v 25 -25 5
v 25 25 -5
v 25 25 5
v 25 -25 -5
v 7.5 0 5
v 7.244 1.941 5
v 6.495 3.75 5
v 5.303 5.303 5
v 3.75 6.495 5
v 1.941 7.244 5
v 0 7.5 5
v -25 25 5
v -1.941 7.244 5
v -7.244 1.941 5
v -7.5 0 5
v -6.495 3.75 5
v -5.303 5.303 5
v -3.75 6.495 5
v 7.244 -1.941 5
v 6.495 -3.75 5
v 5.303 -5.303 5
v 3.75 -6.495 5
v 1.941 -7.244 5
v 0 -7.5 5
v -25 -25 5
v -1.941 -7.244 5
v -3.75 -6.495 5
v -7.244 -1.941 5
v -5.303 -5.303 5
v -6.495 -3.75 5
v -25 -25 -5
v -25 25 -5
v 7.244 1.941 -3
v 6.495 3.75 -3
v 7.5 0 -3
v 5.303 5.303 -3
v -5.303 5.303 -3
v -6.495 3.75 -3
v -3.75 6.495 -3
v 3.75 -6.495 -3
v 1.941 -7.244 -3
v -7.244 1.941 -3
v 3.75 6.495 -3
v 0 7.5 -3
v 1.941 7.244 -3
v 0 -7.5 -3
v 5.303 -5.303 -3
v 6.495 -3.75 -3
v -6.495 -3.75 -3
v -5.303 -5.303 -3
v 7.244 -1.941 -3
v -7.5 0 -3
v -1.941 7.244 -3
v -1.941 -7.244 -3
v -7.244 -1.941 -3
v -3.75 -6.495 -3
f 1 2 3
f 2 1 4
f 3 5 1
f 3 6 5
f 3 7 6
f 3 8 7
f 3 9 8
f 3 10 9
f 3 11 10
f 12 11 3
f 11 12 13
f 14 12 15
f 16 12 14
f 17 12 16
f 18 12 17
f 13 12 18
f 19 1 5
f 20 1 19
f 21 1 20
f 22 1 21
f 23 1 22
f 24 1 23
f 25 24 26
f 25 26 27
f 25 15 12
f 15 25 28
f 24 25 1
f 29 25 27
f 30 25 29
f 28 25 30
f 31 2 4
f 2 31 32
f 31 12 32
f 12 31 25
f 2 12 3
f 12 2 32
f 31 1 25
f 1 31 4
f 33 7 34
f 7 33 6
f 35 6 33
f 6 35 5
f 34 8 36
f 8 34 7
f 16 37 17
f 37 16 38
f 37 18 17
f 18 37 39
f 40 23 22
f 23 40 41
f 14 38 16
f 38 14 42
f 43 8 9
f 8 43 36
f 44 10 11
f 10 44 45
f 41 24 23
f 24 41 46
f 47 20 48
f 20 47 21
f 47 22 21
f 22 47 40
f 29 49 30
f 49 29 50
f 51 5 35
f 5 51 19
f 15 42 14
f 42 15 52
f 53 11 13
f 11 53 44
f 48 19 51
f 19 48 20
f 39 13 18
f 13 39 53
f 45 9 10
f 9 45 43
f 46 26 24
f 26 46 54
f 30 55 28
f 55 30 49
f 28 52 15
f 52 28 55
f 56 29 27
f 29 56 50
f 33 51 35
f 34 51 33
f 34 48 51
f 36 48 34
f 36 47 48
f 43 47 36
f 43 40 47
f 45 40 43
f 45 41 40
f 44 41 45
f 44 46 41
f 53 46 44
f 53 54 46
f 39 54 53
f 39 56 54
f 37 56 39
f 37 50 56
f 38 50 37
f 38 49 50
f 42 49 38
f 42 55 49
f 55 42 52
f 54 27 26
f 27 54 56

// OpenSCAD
difference() {
    cube([50, 50, 10], center=true);
    translate([0, 0, 2])
        cylinder(h=10, d=15, center=true);
}
